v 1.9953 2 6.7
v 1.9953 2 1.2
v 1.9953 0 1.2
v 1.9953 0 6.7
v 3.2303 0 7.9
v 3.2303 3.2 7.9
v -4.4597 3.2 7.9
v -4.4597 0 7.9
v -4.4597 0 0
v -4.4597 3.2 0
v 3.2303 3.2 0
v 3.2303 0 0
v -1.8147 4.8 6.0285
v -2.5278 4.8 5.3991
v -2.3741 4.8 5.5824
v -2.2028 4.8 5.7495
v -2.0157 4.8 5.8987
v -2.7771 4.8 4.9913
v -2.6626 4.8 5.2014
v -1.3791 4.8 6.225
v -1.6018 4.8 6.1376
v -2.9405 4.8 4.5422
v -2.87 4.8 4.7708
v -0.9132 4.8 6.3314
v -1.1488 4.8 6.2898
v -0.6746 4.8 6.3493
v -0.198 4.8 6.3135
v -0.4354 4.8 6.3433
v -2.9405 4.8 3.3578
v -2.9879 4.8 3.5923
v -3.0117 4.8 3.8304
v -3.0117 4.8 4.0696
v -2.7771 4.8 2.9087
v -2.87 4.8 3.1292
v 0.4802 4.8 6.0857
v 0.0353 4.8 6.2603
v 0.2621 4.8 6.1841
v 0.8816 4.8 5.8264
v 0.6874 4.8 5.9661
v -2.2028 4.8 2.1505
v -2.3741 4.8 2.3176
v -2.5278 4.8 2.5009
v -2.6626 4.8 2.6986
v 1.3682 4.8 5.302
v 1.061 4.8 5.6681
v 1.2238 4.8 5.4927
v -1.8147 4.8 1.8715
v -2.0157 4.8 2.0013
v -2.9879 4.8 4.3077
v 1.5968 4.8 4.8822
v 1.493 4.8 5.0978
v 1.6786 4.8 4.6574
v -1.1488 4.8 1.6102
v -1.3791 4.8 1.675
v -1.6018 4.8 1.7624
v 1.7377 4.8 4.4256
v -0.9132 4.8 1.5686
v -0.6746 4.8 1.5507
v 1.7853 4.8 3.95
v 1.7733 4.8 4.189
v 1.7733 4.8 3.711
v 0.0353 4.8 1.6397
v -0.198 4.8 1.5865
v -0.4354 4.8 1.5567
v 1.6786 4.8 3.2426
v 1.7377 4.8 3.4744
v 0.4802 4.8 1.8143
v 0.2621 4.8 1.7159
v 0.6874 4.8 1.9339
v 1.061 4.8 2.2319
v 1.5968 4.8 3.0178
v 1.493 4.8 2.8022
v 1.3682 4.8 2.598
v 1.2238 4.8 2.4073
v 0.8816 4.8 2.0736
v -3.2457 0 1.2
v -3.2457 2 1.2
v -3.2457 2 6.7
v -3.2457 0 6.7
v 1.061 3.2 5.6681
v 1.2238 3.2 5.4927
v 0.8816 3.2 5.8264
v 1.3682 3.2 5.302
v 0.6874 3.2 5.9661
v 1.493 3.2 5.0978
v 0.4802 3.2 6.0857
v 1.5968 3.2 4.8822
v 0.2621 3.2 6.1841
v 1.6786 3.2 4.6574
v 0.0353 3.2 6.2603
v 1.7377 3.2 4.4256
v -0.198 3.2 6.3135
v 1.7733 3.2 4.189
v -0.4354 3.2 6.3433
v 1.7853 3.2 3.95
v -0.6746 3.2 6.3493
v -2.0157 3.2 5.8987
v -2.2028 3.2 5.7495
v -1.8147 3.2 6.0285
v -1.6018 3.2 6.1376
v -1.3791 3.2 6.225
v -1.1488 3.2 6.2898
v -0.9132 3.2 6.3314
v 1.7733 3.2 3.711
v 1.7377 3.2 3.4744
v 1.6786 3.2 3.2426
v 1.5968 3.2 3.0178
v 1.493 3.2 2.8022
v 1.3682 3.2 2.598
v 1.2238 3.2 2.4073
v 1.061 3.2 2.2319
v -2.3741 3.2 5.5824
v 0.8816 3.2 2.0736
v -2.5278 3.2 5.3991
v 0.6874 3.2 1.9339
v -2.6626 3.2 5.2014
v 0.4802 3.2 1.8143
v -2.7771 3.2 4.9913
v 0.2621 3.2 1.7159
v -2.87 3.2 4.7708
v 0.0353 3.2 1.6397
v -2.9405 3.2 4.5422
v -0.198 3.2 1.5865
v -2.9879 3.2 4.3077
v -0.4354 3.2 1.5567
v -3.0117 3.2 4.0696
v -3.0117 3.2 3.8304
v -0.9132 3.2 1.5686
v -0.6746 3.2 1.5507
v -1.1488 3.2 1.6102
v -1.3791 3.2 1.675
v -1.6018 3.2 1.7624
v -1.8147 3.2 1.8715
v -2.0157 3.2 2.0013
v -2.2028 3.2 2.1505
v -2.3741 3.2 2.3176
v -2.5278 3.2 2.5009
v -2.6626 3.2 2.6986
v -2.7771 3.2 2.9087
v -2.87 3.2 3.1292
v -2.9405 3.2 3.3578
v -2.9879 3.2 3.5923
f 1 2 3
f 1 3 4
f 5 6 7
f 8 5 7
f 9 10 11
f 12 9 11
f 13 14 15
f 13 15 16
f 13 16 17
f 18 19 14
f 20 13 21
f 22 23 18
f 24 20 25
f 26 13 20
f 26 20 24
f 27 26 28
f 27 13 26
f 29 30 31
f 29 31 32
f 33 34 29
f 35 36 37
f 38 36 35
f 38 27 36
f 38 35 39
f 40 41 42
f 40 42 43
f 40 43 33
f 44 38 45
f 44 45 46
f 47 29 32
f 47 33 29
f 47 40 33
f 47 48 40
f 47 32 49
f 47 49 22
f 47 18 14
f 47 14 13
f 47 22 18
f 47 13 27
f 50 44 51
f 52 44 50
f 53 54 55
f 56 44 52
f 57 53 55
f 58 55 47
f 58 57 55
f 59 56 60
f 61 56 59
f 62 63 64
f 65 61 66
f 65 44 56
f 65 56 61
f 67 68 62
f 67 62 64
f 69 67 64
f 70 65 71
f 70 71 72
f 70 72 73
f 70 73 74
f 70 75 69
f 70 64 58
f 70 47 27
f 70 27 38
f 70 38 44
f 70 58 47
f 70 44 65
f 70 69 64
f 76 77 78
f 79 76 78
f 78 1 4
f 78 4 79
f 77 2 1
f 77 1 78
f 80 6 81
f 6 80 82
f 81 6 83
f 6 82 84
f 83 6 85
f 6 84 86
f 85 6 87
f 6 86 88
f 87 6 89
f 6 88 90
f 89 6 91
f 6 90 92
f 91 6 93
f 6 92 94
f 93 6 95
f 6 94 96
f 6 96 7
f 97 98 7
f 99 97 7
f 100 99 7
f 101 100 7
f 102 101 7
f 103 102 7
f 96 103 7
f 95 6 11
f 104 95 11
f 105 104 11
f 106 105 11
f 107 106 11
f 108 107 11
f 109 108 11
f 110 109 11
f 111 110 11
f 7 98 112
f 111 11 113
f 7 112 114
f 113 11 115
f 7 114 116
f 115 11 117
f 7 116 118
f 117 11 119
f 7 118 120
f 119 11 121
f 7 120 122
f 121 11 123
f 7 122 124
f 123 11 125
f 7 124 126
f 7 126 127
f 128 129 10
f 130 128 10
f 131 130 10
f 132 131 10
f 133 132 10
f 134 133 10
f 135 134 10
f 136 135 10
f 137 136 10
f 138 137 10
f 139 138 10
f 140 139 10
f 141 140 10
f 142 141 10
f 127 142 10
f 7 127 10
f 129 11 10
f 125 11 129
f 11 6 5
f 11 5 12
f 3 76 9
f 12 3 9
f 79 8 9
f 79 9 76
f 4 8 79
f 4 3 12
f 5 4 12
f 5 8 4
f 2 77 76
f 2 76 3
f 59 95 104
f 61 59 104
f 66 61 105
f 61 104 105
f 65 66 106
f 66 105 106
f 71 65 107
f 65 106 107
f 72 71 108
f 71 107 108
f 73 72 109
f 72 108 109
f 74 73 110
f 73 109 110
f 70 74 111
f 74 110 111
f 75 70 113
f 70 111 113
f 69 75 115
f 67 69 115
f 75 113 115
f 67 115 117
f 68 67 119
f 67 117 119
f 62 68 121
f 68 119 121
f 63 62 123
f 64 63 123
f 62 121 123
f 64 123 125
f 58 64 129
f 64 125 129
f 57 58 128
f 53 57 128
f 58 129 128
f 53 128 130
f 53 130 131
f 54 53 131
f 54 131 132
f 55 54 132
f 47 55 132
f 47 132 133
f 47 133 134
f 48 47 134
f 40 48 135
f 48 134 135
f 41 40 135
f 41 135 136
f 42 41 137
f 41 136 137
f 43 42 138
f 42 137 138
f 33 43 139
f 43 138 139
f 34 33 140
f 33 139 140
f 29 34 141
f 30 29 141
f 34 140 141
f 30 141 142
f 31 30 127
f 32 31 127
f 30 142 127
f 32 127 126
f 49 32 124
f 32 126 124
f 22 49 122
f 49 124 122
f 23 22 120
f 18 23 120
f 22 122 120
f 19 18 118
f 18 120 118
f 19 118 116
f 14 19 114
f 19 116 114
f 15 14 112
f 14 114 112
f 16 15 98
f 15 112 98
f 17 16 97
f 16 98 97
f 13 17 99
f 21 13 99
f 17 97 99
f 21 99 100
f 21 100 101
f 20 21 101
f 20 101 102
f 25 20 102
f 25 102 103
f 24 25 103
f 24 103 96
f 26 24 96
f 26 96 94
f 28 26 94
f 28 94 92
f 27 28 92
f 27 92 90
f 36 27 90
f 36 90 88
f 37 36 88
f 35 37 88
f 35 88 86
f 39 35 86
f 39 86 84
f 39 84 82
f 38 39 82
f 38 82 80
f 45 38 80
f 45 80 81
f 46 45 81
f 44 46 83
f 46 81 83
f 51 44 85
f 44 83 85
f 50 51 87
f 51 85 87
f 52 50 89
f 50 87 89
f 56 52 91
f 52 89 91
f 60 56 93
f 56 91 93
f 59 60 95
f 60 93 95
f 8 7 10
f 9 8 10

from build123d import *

# Parameters (mm, degrees)
BASEFRAMESKETCH_W    = 15.38
BASEFRAMESKETCH_H    = 3.2
BASEFRAME_DEPTH      = 7.9
SKETCH29_W           = 15.38
SKETCH29_H           = 7.9
CUT_EXTRUDE4_DEPTH   = 16.116827041
SKETCH31_R           = 2.197938665
BOSS_EXTRUDE6_DEPTH  = 1.6
LPATTERN4_COUNT      = 2
LPATTERN4_PITCH      = 8
SHELL1_T             = -1.2
BOSS_EXTRUDE7_DEPTH  = 2.3
CUT_EXTRUDE7_DEPTH   = 2.3
FILLET3_R            = 0.1
FILLET4_R            = 0.1
SKETCH38_W           = 7.69
SKETCH38_H           = 7.9
CUT_EXTRUDE8_DEPTH   = 4
BOSS_EXTRUDE16_START = 0.8
SKETCH44_R           = 0.997938665
BOSS_EXTRUDE16_DEPTH = 0.8
BOSS_EXTRUDE17_REACH = 13.769
SKETCH39_W           = 1.2
SKETCH39_H           = 5.5
CUT_EXTRUDE10_DEPTH  = 12.768845427
SKETCH46_W           = 0.335
SKETCH46_H           = 3.2
SKETCH100_W          = 0.349019596
SKETCH100_H          = 5.5
SKETCH101_W          = 0.3
SKETCH101_H          = 5.5
CUT_EXTRUDE27_DEPTH  = 11.500279785
SKETCH104_W          = 1.97
SKETCH104_H          = 1.97
CUT_EXTRUDE28_DEPTH  = 1.6
MOVE_FACE1_BY        = 3.3
CUT_EXTRUDE42_DEPTH  = 14.215613325
SKETCH118_R          = 2.4
SKETCH118_R_2        = 1.8
BOSS_EXTRUDE26_DEPTH = 1.6
SKETCH119_R          = 1.8
CUT_EXTRUDE43_DEPTH  = 12.160161573
SKETCH120_W          = 7.69000258
SKETCH120_H          = 3.3
CUT_EXTRUDE44_DEPTH  = 11.263488994
SKETCH121_R          = 1.8
BOSS_EXTRUDE27_DEPTH = 2.8


with BuildPart() as part:
    # BaseFrameSketch → BaseFrame (new, symmetric)
    with BuildSketch(Plane.XY):
        with Locations((-4.794729064, 1.6)):
            Rectangle(BASEFRAMESKETCH_W, BASEFRAMESKETCH_H)
    extrude(amount=BASEFRAME_DEPTH, both=True)

    # Sketch29 → Cut-Extrude4 (cut, through all)
    with BuildSketch(Plane(origin=(0, 3.2, 0), x_dir=(1, 0, 0), z_dir=(0, 1, 0))):
        with Locations((-4.794729064, 3.95)):
            Rectangle(SKETCH29_W, SKETCH29_H)
    extrude(amount=-CUT_EXTRUDE4_DEPTH, mode=Mode.SUBTRACT)

    # Sketch31 → Boss-Extrude6 (add)
    with BuildSketch(Plane(origin=(0, 3.2, 0), x_dir=(1, 0, 0), z_dir=(0, 1, 0))):
        with Locations((-8.584729064, -4)):
            Circle(SKETCH31_R)
    boss_extrude6 = extrude(amount=BOSS_EXTRUDE6_DEPTH)

    # LPattern4: Boss-Extrude6 ×2
    with Locations(*[(i * LPATTERN4_PITCH, 0, 0) for i in range(1, LPATTERN4_COUNT)]):
        add(boss_extrude6)

    # Shell1
    shell1_openings = [part.faces().sort_by_distance(p)[0] for p in [
        (-4.794729064, 0, 3.95),
    ]]
    offset(amount=SHELL1_T, openings=shell1_openings, kind=Kind.INTERSECTION)

    # Sketch35 → Boss-Extrude7 (add, symmetric)
    with BuildSketch(Plane.XY.offset(3.95)):
        with BuildLine():
            Line((-2.782667729, 3.2), (1.613209601, 3.2))
            ThreePointArc((1.613209601, 3.2), (1.721005084, 3.313571782), (1.810586387, 3.441999215))
            ThreePointArc((1.810586387, 3.441999215), (2.278525574, 4.313545175), (2.440270936, 5.289453921))
            ThreePointArc((2.440270936, 5.289453921), (2.428474077, 6.289536316), (2.360954202, 7.287406564))
            Line((2.360954202, 7.287406564), (1.106266226, 7.287406564))
            ThreePointArc((1.106266226, 7.287406564), (1.22292125, 6.096651625), (1.106266226, 4.905896686))
            ThreePointArc((1.106266226, 4.905896686), (-0.584729064, 4.033269084), (-2.275724354, 4.905896686))
            ThreePointArc((-2.275724354, 4.905896686), (-2.392379378, 6.096651625), (-2.275724354, 7.287406564))
            Line((-2.275724354, 7.287406564), (-3.53041233, 7.287406564))
            ThreePointArc((-3.53041233, 7.287406564), (-3.597932205, 6.289536316), (-3.609729064, 5.289453921))
            ThreePointArc((-3.609729064, 5.289453921), (-3.447983702, 4.313545175), (-2.980044515, 3.441999215))
            ThreePointArc((-2.980044515, 3.441999215), (-2.890463212, 3.313571782), (-2.782667729, 3.2))
        make_face()
    extrude(amount=BOSS_EXTRUDE7_DEPTH, both=True)

    # Sketch36 → Cut-Extrude7 (cut, symmetric)
    with BuildSketch(Plane.XY.offset(3.95)):
        with BuildLine():
            Line((-2.195211087, 4.8), (1.025752959, 4.8))
            ThreePointArc((1.025752959, 4.8), (-0.584729064, 4.033269084), (-2.195211087, 4.8))
        make_face()
    extrude(amount=CUT_EXTRUDE7_DEPTH, both=True, mode=Mode.SUBTRACT)

    # Fillet3
    fillet3_edges = [part.edges().sort_by_distance(p)[0] for p in [
        (-2.275724354, 4.905896686, 3.95),
    ]]
    fillet(fillet3_edges, radius=FILLET3_R)

    # Fillet4
    fillet4_edges = [part.edges().sort_by_distance(p)[0] for p in [
        (1.106266226, 4.905896686, 3.95),
    ]]
    fillet(fillet4_edges, radius=FILLET4_R)

    # Sketch38 → Cut-Extrude8 (cut, symmetric)
    with BuildSketch(Plane(origin=(0, 3.2, 0), x_dir=(1, 0, 0), z_dir=(0, 1, 0))):
        with Locations((-8.639729064, -3.95)):
            Rectangle(SKETCH38_W, SKETCH38_H)
    extrude(amount=CUT_EXTRUDE8_DEPTH, both=True, mode=Mode.SUBTRACT)

    # Sketch44 → Boss-Extrude16 (add)
    with BuildSketch(Plane.XZ.offset(-3.2).offset(BOSS_EXTRUDE16_START)):
        with Locations((-0.584729064, 4)):
            Circle(SKETCH44_R)
    extrude(amount=-BOSS_EXTRUDE16_DEPTH)

    # Sketch39 → Boss-Extrude17 (add, up to next)
    with BuildSketch(Plane(origin=(0, 0, 0), x_dir=(-1, 0, 0), z_dir=(0, -1, 0)), mode=Mode.PRIVATE) as boss_extrude17_sk1:
        with Locations((4.194729064, -3.95)):
            Rectangle(SKETCH39_W, SKETCH39_H)
    boss_extrude17_tool1 = extrude(boss_extrude17_sk1.sketch, amount=-BOSS_EXTRUDE17_REACH, mode=Mode.PRIVATE) - part.part
    add(boss_extrude17_tool1.solids().sort_by_distance((-4.194729, 0, 3.95))[0])

    # Sketch45 → Cut-Extrude10 (cut, through all)
    with BuildSketch(Plane.XY.offset(7.9)):
        Polygon((-4.794729064, 3.2), (-4.459731644, 3.2), (-4.459731644, 0), (-4.794729064, -0.001314844), align=None)
    extrude(amount=-CUT_EXTRUDE10_DEPTH, mode=Mode.SUBTRACT)

    # Sweep9: sweep along a curve in space
    with BuildLine() as sweep9_path:
        Line((2.895270936, 3.2, 7.9), (2.895270936, 3.2, 0))
    # Sketch46 → Sweep9 (sweep)
    with BuildSketch(Plane.XY.offset(7.9)):
        with Locations((3.062770936, 1.6)):
            Rectangle(SKETCH46_W, SKETCH46_H)
    sweep(path=sweep9_path.line)

    # Sweep24: sweep along a curve in space
    with BuildLine() as sweep24_path:
        Line((-3.594729064, 2, 6.7), (-3.594729064, 0, 6.7))
    # Sketch100 → Sweep24 (sweep)
    with BuildSketch(Plane(origin=(0, 2, 0), x_dir=(-1, 0, 0), z_dir=(0, -1, 0))):
        with Locations((3.420219266, -3.95)):
            Rectangle(SKETCH100_W, SKETCH100_H)
    sweep(path=sweep24_path.line)

    # Sketch101 → Cut-Extrude27 (cut, through all)
    with BuildSketch(Plane(origin=(0, 2, 0), x_dir=(-1, 0, 0), z_dir=(0, -1, 0))):
        with Locations((-1.845270936, -3.95)):
            Rectangle(SKETCH101_W, SKETCH101_H)
    extrude(amount=CUT_EXTRUDE27_DEPTH, mode=Mode.SUBTRACT)

    # Sketch104 → Cut-Extrude28 (cut)
    with BuildSketch(Plane(origin=(0, 2, 0), x_dir=(-1, 0, 0), z_dir=(0, -1, 0))):
        with Locations((0.625219266, -3.95)):
            Rectangle(SKETCH104_W, SKETCH104_H)
    extrude(amount=-CUT_EXTRUDE28_DEPTH, mode=Mode.SUBTRACT)

    # Sweep27: sweep along a curve in space
    with BuildLine() as sweep27_path:
        Line((0.359780734, 2, 3.677846589), (0.359780734, 2.4, 3.677846589))
    # Sketch105 → Sweep27 (sweep)
    with BuildSketch(Plane(origin=(0, 2, 0), x_dir=(-1, 0, 0), z_dir=(0, -1, 0))):
        with BuildLine():
            Line((-0.359780734, -3.677846589), (-0.359780734, -4.322153411))
            ThreePointArc((-0.359780734, -4.322153411), (-0.413209601, -4), (-0.359780734, -3.677846589))
        make_face()
        with BuildLine():
            Line((0.933522096, -4.935), (0.235936032, -4.935))
            ThreePointArc((0.235936032, -4.935), (0.584729064, -4.997938665), (0.933522096, -4.935))
        make_face()
    sweep(path=sweep27_path.line)

    # Move Face1: a face moved outward by 3.3
    extrude(part.faces().sort_by_distance((-0.614730354, 0, 0.79))[0], amount=MOVE_FACE1_BY, dir=(0, -1, 0))

    # Sketch115 → Cut-Extrude42 (cut, through all)
    with BuildSketch(Plane.ZY.offset(4.459731644)):
        Polygon((0, 3.2), (7.9, 3.2), (7.9, 7.494096257), (-0.222033581, 7.422914641), (-0.222033581, 3.2), align=None)
    extrude(amount=-CUT_EXTRUDE42_DEPTH, mode=Mode.SUBTRACT)

    # Sketch118 → Boss-Extrude26 (add)
    with BuildSketch(Plane(origin=(0, 3.2, 0), x_dir=(1, 0, 0), z_dir=(0, 1, 0))):
        with Locations((-0.614730354, -3.95)):
            Circle(SKETCH118_R)
        with Locations((-0.614730354, -3.95)):
            Circle(SKETCH118_R_2, mode=Mode.SUBTRACT)
    extrude(amount=BOSS_EXTRUDE26_DEPTH)

    # Sketch119 → Cut-Extrude43 (cut, through all)
    with BuildSketch(Plane(origin=(0, 3.2, 0), x_dir=(1, 0, 0), z_dir=(0, 1, 0))):
        with Locations((-0.614730354, -3.95)):
            Circle(SKETCH119_R)
    extrude(amount=-CUT_EXTRUDE43_DEPTH, mode=Mode.SUBTRACT)

    # Sketch120 → Cut-Extrude44 (cut, through all)
    with BuildSketch(Plane.XY.offset(7.9)):
        with Locations((-0.614730354, -1.65)):
            Rectangle(SKETCH120_W, SKETCH120_H)
    extrude(amount=-CUT_EXTRUDE44_DEPTH, mode=Mode.SUBTRACT)

    # Sketch121 → Boss-Extrude27 (add)
    with BuildSketch(Plane(origin=(0, 2, 0), x_dir=(-1, 0, 0), z_dir=(0, -1, 0))):
        with Locations((0.614730354, -3.95)):
            Circle(SKETCH121_R)
    extrude(amount=-BOSS_EXTRUDE27_DEPTH)


solid = part.part
